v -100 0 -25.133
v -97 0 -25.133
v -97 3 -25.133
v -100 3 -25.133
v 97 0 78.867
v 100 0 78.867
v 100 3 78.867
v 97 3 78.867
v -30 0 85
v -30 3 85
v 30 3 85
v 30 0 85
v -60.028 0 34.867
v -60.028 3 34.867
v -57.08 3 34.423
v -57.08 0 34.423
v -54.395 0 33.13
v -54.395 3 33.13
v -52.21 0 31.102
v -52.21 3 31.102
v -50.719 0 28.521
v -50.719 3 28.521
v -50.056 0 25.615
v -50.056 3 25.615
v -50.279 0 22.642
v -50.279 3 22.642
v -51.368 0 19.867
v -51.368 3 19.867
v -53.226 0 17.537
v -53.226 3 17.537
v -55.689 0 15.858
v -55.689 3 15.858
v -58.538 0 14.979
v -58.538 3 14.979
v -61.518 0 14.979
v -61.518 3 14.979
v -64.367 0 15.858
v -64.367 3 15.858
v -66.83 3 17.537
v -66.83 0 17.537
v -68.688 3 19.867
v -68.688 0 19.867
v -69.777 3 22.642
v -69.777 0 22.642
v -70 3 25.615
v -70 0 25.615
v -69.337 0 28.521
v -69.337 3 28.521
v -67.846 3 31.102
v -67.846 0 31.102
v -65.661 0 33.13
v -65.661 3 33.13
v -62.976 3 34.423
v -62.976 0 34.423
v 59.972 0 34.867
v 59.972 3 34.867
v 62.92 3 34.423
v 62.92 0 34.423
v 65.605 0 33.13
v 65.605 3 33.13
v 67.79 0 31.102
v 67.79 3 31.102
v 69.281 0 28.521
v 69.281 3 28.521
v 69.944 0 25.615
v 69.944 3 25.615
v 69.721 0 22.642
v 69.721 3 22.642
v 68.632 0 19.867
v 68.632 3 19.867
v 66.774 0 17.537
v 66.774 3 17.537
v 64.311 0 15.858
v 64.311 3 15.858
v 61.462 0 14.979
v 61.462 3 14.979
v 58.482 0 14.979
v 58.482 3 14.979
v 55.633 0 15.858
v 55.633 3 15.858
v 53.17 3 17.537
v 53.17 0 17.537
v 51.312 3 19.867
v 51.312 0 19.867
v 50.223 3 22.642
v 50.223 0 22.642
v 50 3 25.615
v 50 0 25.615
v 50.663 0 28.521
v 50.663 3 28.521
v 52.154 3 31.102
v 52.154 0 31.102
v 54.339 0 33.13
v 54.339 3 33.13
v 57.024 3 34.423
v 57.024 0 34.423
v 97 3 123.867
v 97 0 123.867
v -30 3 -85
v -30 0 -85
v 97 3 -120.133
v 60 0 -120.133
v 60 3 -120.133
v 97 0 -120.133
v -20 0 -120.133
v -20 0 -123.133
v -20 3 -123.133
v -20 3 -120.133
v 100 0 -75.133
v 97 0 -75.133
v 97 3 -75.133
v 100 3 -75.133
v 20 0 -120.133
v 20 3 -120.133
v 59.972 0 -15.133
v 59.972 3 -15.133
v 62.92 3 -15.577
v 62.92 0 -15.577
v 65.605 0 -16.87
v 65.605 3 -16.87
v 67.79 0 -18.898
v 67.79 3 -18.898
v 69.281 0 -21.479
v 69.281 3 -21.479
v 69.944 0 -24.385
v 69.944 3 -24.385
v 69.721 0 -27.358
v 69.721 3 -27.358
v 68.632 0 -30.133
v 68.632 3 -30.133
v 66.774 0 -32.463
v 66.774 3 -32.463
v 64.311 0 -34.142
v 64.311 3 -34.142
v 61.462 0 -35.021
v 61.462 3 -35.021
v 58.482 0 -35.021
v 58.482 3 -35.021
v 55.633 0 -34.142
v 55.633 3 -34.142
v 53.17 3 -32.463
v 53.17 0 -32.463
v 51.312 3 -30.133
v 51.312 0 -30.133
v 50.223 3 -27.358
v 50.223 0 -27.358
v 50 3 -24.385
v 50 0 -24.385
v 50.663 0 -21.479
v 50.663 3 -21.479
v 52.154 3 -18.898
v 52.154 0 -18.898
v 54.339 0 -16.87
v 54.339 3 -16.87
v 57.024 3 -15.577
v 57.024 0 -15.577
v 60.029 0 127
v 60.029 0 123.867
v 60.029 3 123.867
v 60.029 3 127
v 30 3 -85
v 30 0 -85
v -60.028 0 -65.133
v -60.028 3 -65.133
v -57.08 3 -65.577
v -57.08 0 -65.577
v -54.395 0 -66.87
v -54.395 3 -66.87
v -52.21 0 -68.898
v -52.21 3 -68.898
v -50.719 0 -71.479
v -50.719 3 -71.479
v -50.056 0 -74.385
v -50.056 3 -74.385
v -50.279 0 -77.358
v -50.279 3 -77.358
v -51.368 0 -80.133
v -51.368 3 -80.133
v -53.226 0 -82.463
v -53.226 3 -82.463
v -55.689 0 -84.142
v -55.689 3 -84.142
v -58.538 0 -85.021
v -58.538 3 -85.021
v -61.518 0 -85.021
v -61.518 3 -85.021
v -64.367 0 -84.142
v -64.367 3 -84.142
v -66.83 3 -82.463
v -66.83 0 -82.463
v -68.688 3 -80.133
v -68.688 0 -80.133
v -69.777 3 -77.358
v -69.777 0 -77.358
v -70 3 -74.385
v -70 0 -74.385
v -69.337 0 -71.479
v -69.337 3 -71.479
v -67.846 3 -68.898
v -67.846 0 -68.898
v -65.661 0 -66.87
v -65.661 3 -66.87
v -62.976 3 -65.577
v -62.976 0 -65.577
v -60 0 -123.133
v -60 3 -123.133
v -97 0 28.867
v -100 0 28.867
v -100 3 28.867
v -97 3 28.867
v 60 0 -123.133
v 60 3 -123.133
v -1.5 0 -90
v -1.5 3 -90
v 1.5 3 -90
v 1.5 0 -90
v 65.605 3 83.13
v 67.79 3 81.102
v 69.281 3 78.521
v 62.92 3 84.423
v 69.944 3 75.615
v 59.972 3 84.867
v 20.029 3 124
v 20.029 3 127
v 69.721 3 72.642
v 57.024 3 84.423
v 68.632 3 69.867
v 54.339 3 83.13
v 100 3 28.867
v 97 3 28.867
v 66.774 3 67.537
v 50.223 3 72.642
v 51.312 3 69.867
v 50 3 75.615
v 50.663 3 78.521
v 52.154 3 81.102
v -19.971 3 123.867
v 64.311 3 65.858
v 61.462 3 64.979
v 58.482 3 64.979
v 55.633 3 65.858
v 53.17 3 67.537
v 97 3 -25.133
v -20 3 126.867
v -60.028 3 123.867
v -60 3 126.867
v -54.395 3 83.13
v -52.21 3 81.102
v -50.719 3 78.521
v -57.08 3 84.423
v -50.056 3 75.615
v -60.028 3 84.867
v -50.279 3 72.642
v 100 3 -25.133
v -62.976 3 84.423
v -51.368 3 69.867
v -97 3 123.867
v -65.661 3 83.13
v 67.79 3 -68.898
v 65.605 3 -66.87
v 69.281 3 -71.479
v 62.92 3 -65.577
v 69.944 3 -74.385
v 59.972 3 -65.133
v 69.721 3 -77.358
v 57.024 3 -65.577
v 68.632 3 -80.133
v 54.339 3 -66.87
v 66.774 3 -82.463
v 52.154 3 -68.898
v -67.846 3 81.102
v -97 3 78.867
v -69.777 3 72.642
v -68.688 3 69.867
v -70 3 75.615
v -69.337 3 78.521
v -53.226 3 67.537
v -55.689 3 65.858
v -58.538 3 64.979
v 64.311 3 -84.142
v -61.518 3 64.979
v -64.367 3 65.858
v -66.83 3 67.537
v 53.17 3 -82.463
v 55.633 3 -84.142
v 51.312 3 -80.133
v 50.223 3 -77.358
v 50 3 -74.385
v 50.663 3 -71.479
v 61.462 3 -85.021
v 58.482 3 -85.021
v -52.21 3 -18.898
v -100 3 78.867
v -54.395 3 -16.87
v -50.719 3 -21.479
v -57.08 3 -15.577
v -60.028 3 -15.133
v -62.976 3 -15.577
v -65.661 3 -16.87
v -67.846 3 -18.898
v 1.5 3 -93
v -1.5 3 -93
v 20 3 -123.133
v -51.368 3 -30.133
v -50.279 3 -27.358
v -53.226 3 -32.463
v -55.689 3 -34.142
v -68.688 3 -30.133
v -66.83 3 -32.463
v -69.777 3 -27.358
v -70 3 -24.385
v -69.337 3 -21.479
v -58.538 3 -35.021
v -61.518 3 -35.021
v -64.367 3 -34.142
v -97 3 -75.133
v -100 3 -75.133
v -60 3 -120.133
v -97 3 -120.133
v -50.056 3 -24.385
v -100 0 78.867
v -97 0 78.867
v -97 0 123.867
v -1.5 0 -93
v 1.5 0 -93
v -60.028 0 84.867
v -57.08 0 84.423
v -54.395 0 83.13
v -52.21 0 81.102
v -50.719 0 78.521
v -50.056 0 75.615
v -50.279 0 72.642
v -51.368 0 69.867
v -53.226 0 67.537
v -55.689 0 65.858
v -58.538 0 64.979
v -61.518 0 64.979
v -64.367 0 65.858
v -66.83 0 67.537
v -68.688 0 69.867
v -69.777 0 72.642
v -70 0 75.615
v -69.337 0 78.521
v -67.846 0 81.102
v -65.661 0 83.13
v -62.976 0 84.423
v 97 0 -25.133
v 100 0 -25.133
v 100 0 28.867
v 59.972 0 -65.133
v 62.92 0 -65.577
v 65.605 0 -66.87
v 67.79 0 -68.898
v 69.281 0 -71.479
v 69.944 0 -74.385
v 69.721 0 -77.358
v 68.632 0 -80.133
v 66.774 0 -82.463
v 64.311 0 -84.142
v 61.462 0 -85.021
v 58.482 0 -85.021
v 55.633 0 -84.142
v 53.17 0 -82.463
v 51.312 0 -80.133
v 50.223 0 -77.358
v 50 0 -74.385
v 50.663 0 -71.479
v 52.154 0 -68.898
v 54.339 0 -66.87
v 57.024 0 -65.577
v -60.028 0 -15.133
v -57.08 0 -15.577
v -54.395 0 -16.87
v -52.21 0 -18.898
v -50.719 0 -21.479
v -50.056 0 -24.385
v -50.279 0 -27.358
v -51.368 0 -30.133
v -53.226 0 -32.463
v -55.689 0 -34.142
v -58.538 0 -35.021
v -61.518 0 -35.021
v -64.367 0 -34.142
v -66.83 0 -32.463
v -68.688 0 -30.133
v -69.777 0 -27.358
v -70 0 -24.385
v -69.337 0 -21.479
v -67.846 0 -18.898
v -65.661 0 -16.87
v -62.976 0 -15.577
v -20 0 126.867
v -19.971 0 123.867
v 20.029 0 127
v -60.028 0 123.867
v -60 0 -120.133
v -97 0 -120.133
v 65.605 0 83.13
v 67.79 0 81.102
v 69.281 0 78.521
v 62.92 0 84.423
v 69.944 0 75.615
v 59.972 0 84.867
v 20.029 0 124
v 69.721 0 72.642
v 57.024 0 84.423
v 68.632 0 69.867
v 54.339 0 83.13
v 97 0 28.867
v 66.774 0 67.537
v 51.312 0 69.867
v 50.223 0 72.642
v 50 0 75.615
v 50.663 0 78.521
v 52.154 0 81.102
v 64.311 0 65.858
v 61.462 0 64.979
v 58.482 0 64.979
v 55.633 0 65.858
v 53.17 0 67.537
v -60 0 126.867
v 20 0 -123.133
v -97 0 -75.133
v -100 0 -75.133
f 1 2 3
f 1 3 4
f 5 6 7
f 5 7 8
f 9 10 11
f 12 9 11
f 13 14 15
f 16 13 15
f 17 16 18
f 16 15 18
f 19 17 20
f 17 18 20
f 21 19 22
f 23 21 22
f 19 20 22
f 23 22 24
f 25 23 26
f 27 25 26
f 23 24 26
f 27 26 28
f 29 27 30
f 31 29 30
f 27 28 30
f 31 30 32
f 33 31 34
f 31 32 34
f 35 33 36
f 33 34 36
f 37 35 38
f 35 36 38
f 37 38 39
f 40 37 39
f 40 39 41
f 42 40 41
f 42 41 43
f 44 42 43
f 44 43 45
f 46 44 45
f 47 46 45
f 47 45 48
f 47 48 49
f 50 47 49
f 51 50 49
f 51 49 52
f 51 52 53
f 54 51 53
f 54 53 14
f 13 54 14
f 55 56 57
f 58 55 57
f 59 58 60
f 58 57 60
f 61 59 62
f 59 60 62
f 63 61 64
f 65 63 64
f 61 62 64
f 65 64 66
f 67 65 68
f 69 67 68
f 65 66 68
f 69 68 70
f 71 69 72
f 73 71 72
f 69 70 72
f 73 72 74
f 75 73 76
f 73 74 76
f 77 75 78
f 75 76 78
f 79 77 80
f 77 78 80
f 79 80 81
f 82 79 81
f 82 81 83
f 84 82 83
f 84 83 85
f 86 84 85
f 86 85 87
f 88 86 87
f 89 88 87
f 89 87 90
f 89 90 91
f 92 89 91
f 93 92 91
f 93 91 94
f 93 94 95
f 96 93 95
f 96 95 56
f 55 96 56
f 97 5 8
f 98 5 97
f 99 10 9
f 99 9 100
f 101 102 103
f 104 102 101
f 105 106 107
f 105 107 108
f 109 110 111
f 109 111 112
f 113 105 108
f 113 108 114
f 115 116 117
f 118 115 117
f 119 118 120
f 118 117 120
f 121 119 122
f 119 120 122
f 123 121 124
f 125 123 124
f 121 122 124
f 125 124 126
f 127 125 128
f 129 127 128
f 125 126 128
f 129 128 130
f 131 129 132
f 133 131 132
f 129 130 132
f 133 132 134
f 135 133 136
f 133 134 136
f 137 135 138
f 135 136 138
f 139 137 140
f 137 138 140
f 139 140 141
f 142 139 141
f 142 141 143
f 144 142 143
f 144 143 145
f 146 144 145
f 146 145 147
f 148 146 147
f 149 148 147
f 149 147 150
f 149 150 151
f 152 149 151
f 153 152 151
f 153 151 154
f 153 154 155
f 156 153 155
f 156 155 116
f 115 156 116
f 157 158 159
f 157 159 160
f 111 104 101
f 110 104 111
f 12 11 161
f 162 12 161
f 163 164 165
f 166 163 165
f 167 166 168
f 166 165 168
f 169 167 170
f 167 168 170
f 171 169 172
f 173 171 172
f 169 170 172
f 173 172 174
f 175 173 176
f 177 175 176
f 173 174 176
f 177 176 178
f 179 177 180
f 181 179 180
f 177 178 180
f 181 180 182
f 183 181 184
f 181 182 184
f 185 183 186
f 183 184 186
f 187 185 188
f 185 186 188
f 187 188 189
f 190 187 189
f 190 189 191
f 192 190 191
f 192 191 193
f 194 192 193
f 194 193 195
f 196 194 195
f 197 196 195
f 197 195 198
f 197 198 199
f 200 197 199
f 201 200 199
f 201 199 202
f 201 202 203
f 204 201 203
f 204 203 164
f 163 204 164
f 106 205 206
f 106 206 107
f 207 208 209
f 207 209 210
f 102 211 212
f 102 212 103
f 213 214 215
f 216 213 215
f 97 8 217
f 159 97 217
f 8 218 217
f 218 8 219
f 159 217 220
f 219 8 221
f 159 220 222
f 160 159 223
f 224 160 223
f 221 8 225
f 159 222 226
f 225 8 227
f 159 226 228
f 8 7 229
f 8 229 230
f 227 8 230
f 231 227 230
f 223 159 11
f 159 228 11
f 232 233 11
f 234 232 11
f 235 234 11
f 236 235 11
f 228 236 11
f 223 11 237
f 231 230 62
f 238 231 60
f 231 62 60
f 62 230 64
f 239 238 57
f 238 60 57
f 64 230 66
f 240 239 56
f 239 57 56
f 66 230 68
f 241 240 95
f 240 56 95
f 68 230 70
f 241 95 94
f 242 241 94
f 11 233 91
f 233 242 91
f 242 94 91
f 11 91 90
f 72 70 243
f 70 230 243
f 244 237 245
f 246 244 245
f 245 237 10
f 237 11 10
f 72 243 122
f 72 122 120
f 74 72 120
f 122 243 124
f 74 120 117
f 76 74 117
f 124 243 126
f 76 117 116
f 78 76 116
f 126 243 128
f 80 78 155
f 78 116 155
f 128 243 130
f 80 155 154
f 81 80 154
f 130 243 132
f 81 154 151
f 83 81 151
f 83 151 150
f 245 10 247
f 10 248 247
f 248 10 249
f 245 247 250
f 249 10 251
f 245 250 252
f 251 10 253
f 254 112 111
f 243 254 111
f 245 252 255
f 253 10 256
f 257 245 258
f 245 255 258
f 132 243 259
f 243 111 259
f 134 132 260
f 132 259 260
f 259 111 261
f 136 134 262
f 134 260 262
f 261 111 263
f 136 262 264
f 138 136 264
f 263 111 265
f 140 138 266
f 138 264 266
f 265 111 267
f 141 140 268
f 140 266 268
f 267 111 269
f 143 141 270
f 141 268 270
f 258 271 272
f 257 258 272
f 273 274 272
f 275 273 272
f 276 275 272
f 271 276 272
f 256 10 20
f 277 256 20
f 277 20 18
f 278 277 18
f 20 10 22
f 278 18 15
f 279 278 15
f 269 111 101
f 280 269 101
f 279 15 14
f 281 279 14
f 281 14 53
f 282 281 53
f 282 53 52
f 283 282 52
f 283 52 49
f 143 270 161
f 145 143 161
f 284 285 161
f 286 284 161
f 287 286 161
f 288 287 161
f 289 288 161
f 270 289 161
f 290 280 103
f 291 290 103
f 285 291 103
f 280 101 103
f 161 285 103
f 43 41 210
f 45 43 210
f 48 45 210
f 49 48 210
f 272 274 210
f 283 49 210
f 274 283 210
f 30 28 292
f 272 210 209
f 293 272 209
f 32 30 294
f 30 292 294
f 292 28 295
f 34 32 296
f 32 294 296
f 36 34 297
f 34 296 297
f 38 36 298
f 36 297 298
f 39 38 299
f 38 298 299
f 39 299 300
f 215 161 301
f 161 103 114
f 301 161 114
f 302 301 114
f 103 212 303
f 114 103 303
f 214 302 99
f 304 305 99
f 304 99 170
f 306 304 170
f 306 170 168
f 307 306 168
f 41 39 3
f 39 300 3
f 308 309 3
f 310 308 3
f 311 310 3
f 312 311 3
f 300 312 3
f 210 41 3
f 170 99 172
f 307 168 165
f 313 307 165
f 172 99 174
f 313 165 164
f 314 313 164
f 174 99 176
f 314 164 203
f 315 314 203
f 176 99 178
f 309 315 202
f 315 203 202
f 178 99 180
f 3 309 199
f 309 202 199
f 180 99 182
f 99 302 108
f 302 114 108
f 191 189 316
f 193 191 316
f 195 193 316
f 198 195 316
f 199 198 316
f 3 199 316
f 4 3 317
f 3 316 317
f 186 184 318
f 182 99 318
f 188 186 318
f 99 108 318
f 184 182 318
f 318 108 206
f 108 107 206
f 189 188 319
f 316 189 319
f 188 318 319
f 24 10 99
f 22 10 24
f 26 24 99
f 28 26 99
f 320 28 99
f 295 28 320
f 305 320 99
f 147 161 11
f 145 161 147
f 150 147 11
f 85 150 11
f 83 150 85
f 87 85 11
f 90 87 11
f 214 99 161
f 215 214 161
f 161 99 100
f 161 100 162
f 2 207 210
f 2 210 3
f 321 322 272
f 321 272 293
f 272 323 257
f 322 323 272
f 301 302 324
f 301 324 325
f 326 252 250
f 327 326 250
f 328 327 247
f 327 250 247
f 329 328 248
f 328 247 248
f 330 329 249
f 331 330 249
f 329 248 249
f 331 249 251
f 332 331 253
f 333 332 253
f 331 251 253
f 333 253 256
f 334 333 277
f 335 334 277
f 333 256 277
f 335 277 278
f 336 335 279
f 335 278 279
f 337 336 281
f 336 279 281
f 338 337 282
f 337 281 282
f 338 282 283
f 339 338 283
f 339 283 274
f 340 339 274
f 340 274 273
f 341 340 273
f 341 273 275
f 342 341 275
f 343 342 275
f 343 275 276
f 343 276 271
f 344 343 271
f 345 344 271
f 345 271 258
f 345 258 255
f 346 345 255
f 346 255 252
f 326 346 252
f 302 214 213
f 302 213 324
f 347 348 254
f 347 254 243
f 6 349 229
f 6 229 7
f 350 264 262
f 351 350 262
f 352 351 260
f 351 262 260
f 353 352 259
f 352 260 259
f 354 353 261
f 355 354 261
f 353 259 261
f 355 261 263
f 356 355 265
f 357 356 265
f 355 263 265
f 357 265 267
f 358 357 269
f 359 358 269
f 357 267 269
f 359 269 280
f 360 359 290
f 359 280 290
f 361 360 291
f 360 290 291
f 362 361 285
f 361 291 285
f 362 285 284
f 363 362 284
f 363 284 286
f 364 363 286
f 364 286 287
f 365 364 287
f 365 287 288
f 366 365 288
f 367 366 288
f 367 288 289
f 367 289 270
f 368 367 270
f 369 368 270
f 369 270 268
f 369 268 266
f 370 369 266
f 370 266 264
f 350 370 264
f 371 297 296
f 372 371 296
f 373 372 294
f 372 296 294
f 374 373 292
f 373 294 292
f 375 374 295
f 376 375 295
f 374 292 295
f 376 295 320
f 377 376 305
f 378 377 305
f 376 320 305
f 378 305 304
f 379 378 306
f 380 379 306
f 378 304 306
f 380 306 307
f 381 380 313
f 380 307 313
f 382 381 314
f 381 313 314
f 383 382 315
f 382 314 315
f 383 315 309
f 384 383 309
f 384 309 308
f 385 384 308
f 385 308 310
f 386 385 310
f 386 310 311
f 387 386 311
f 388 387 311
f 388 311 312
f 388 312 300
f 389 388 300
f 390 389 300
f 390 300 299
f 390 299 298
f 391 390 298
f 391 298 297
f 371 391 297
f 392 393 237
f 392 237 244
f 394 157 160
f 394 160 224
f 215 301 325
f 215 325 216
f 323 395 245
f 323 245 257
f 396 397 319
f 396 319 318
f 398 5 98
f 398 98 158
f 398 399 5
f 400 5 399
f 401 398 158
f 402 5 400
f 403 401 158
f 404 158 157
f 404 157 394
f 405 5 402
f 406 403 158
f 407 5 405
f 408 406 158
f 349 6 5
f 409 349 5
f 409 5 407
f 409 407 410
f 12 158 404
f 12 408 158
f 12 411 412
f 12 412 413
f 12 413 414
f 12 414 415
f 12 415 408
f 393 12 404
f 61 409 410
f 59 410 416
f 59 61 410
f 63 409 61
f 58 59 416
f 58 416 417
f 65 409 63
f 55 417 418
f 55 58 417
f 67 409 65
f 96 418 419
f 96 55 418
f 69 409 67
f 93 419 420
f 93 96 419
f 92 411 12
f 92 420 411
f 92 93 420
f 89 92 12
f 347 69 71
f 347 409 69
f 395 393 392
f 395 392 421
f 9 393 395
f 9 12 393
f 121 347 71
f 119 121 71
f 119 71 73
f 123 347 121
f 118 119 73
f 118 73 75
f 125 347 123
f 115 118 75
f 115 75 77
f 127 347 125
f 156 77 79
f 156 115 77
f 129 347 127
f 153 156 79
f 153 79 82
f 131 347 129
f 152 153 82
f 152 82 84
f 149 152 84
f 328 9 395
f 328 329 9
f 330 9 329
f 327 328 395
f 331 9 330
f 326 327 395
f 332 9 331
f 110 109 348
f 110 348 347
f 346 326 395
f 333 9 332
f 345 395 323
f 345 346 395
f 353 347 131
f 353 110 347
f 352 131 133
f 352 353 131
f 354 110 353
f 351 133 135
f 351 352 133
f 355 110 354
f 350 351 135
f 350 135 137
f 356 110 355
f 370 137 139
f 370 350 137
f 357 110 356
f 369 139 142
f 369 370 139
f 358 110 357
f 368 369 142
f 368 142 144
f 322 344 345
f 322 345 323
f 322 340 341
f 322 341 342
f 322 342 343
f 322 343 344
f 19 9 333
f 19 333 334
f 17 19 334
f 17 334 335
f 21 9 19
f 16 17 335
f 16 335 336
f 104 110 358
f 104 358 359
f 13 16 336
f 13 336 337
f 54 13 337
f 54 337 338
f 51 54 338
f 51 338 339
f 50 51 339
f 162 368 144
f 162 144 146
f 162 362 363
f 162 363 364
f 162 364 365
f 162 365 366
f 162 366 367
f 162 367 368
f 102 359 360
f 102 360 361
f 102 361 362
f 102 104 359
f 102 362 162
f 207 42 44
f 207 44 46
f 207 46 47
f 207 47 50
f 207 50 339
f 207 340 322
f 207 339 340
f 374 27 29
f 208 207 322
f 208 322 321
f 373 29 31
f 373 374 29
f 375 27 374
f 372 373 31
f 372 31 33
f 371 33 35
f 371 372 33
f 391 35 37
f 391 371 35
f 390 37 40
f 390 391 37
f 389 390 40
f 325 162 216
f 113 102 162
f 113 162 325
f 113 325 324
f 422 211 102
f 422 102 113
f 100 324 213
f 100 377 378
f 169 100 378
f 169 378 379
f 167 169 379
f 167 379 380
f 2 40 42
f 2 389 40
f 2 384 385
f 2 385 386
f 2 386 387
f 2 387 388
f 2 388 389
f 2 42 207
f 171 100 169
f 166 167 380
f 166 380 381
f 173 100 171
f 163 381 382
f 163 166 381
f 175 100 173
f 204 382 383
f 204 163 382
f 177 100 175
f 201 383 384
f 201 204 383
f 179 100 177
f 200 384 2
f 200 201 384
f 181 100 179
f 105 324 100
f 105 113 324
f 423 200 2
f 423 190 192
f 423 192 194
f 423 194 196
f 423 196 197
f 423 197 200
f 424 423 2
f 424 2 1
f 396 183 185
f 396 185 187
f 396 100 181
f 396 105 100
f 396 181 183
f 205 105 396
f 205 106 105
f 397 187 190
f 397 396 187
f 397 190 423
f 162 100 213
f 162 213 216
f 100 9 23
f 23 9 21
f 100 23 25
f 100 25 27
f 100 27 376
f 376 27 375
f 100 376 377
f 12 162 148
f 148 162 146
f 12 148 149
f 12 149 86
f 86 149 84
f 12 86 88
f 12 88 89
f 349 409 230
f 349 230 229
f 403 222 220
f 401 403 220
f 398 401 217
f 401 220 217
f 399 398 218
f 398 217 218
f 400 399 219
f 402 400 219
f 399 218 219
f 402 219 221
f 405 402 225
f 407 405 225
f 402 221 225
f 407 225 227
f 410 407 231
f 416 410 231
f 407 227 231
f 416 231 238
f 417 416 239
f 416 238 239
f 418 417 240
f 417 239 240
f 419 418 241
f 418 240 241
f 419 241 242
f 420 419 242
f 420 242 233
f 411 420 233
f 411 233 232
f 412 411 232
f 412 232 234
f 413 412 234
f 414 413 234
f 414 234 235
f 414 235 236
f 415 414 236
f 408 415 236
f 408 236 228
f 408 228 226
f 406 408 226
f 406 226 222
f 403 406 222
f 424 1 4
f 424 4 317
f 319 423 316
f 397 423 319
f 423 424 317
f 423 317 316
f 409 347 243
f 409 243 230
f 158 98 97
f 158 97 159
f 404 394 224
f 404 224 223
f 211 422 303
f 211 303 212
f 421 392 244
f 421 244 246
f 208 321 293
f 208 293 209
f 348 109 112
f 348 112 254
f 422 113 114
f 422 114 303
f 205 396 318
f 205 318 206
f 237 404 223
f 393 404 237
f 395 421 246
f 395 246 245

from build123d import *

# Parameters (mm, degrees)
BOSS_EXTRUDE1_DEPTH = 3
SKETCH2_R           = 10
SKETCH2_W           = 60
SKETCH2_H           = 170
CUT_EXTRUDE1_DEPTH  = 162.672508486


with BuildPart() as part:
    # Sketch1 → Boss-Extrude1 (new body)
    with BuildSketch(Plane(origin=(0, 0, 0), x_dir=(1, 0, 0), z_dir=(0, 1, 0))):
        Polygon((20, 123.132735738), (60, 123.132735738), (60, 120.132735738), (97, 120.132735738), (97, 75.132735738), (100, 75.132735738), (100, 25.132735738), (97, 25.132735738), (97, -28.867264262), (100, -28.867264262), (100, -78.867264262), (97, -78.867264262), (97, -123.867264262), (60.028527915, -123.867264262), (60.028527915, -127), (20.028527915, -127), (20.028527915, -124), (-19.971472085, -123.867399906), (-20, -126.867264262), (-60, -126.867264262), (-60.028027258, -123.867395186), (-97, -123.867264262), (-97, -78.867264262), (-100, -78.867264262), (-100, -28.867264262), (-97, -28.867264262), (-97, 25.132735738), (-100, 25.132735738), (-100, 75.132735738), (-97, 75.132735738), (-97, 120.132735738), (-60, 120.132735738), (-60, 123.132735738), (-20, 123.132735738), (-20, 120.132735738), (20, 120.132735738), align=None)
    extrude(amount=BOSS_EXTRUDE1_DEPTH)

    # Sketch2 → Cut-Extrude1 (cut, through all)
    with BuildSketch(Plane(origin=(0, 3, 0), x_dir=(1, 0, 0), z_dir=(0, 1, 0))):
        with Locations(Location((-60.028027258, 75.132735738, 0), (0, 0, 270))):
            Circle(SKETCH2_R)
        with Locations(Location((59.971972742, 75.132735738, 0), (0, 0, 270))):
            Circle(SKETCH2_R)
        with Locations(Location((-60.028027258, 25.132735738, 0), (0, 0, 270))):
            Circle(SKETCH2_R)
        with Locations(Location((59.971972742, 25.132735738, 0), (0, 0, 270))):
            Circle(SKETCH2_R)
        with Locations(Location((-60.028027258, -24.867264262, 0), (0, 0, 270))):
            Circle(SKETCH2_R)
        with Locations(Location((59.971972742, -24.867264262, 0), (0, 0, 270))):
            Circle(SKETCH2_R)
        with Locations(Location((-60.028027258, -74.867264262, 0), (0, 0, 270))):
            Circle(SKETCH2_R)
        with Locations(Location((59.971972742, -74.867264262, 0), (0, 0, 270))):
            Circle(SKETCH2_R)
        Rectangle(SKETCH2_W, SKETCH2_H)
        Polygon((0, 90), (-1.5, 90), (-1.5, 93), (1.5, 93), (1.5, 90), align=None)
    extrude(amount=-CUT_EXTRUDE1_DEPTH, mode=Mode.SUBTRACT)


solid = part.part
